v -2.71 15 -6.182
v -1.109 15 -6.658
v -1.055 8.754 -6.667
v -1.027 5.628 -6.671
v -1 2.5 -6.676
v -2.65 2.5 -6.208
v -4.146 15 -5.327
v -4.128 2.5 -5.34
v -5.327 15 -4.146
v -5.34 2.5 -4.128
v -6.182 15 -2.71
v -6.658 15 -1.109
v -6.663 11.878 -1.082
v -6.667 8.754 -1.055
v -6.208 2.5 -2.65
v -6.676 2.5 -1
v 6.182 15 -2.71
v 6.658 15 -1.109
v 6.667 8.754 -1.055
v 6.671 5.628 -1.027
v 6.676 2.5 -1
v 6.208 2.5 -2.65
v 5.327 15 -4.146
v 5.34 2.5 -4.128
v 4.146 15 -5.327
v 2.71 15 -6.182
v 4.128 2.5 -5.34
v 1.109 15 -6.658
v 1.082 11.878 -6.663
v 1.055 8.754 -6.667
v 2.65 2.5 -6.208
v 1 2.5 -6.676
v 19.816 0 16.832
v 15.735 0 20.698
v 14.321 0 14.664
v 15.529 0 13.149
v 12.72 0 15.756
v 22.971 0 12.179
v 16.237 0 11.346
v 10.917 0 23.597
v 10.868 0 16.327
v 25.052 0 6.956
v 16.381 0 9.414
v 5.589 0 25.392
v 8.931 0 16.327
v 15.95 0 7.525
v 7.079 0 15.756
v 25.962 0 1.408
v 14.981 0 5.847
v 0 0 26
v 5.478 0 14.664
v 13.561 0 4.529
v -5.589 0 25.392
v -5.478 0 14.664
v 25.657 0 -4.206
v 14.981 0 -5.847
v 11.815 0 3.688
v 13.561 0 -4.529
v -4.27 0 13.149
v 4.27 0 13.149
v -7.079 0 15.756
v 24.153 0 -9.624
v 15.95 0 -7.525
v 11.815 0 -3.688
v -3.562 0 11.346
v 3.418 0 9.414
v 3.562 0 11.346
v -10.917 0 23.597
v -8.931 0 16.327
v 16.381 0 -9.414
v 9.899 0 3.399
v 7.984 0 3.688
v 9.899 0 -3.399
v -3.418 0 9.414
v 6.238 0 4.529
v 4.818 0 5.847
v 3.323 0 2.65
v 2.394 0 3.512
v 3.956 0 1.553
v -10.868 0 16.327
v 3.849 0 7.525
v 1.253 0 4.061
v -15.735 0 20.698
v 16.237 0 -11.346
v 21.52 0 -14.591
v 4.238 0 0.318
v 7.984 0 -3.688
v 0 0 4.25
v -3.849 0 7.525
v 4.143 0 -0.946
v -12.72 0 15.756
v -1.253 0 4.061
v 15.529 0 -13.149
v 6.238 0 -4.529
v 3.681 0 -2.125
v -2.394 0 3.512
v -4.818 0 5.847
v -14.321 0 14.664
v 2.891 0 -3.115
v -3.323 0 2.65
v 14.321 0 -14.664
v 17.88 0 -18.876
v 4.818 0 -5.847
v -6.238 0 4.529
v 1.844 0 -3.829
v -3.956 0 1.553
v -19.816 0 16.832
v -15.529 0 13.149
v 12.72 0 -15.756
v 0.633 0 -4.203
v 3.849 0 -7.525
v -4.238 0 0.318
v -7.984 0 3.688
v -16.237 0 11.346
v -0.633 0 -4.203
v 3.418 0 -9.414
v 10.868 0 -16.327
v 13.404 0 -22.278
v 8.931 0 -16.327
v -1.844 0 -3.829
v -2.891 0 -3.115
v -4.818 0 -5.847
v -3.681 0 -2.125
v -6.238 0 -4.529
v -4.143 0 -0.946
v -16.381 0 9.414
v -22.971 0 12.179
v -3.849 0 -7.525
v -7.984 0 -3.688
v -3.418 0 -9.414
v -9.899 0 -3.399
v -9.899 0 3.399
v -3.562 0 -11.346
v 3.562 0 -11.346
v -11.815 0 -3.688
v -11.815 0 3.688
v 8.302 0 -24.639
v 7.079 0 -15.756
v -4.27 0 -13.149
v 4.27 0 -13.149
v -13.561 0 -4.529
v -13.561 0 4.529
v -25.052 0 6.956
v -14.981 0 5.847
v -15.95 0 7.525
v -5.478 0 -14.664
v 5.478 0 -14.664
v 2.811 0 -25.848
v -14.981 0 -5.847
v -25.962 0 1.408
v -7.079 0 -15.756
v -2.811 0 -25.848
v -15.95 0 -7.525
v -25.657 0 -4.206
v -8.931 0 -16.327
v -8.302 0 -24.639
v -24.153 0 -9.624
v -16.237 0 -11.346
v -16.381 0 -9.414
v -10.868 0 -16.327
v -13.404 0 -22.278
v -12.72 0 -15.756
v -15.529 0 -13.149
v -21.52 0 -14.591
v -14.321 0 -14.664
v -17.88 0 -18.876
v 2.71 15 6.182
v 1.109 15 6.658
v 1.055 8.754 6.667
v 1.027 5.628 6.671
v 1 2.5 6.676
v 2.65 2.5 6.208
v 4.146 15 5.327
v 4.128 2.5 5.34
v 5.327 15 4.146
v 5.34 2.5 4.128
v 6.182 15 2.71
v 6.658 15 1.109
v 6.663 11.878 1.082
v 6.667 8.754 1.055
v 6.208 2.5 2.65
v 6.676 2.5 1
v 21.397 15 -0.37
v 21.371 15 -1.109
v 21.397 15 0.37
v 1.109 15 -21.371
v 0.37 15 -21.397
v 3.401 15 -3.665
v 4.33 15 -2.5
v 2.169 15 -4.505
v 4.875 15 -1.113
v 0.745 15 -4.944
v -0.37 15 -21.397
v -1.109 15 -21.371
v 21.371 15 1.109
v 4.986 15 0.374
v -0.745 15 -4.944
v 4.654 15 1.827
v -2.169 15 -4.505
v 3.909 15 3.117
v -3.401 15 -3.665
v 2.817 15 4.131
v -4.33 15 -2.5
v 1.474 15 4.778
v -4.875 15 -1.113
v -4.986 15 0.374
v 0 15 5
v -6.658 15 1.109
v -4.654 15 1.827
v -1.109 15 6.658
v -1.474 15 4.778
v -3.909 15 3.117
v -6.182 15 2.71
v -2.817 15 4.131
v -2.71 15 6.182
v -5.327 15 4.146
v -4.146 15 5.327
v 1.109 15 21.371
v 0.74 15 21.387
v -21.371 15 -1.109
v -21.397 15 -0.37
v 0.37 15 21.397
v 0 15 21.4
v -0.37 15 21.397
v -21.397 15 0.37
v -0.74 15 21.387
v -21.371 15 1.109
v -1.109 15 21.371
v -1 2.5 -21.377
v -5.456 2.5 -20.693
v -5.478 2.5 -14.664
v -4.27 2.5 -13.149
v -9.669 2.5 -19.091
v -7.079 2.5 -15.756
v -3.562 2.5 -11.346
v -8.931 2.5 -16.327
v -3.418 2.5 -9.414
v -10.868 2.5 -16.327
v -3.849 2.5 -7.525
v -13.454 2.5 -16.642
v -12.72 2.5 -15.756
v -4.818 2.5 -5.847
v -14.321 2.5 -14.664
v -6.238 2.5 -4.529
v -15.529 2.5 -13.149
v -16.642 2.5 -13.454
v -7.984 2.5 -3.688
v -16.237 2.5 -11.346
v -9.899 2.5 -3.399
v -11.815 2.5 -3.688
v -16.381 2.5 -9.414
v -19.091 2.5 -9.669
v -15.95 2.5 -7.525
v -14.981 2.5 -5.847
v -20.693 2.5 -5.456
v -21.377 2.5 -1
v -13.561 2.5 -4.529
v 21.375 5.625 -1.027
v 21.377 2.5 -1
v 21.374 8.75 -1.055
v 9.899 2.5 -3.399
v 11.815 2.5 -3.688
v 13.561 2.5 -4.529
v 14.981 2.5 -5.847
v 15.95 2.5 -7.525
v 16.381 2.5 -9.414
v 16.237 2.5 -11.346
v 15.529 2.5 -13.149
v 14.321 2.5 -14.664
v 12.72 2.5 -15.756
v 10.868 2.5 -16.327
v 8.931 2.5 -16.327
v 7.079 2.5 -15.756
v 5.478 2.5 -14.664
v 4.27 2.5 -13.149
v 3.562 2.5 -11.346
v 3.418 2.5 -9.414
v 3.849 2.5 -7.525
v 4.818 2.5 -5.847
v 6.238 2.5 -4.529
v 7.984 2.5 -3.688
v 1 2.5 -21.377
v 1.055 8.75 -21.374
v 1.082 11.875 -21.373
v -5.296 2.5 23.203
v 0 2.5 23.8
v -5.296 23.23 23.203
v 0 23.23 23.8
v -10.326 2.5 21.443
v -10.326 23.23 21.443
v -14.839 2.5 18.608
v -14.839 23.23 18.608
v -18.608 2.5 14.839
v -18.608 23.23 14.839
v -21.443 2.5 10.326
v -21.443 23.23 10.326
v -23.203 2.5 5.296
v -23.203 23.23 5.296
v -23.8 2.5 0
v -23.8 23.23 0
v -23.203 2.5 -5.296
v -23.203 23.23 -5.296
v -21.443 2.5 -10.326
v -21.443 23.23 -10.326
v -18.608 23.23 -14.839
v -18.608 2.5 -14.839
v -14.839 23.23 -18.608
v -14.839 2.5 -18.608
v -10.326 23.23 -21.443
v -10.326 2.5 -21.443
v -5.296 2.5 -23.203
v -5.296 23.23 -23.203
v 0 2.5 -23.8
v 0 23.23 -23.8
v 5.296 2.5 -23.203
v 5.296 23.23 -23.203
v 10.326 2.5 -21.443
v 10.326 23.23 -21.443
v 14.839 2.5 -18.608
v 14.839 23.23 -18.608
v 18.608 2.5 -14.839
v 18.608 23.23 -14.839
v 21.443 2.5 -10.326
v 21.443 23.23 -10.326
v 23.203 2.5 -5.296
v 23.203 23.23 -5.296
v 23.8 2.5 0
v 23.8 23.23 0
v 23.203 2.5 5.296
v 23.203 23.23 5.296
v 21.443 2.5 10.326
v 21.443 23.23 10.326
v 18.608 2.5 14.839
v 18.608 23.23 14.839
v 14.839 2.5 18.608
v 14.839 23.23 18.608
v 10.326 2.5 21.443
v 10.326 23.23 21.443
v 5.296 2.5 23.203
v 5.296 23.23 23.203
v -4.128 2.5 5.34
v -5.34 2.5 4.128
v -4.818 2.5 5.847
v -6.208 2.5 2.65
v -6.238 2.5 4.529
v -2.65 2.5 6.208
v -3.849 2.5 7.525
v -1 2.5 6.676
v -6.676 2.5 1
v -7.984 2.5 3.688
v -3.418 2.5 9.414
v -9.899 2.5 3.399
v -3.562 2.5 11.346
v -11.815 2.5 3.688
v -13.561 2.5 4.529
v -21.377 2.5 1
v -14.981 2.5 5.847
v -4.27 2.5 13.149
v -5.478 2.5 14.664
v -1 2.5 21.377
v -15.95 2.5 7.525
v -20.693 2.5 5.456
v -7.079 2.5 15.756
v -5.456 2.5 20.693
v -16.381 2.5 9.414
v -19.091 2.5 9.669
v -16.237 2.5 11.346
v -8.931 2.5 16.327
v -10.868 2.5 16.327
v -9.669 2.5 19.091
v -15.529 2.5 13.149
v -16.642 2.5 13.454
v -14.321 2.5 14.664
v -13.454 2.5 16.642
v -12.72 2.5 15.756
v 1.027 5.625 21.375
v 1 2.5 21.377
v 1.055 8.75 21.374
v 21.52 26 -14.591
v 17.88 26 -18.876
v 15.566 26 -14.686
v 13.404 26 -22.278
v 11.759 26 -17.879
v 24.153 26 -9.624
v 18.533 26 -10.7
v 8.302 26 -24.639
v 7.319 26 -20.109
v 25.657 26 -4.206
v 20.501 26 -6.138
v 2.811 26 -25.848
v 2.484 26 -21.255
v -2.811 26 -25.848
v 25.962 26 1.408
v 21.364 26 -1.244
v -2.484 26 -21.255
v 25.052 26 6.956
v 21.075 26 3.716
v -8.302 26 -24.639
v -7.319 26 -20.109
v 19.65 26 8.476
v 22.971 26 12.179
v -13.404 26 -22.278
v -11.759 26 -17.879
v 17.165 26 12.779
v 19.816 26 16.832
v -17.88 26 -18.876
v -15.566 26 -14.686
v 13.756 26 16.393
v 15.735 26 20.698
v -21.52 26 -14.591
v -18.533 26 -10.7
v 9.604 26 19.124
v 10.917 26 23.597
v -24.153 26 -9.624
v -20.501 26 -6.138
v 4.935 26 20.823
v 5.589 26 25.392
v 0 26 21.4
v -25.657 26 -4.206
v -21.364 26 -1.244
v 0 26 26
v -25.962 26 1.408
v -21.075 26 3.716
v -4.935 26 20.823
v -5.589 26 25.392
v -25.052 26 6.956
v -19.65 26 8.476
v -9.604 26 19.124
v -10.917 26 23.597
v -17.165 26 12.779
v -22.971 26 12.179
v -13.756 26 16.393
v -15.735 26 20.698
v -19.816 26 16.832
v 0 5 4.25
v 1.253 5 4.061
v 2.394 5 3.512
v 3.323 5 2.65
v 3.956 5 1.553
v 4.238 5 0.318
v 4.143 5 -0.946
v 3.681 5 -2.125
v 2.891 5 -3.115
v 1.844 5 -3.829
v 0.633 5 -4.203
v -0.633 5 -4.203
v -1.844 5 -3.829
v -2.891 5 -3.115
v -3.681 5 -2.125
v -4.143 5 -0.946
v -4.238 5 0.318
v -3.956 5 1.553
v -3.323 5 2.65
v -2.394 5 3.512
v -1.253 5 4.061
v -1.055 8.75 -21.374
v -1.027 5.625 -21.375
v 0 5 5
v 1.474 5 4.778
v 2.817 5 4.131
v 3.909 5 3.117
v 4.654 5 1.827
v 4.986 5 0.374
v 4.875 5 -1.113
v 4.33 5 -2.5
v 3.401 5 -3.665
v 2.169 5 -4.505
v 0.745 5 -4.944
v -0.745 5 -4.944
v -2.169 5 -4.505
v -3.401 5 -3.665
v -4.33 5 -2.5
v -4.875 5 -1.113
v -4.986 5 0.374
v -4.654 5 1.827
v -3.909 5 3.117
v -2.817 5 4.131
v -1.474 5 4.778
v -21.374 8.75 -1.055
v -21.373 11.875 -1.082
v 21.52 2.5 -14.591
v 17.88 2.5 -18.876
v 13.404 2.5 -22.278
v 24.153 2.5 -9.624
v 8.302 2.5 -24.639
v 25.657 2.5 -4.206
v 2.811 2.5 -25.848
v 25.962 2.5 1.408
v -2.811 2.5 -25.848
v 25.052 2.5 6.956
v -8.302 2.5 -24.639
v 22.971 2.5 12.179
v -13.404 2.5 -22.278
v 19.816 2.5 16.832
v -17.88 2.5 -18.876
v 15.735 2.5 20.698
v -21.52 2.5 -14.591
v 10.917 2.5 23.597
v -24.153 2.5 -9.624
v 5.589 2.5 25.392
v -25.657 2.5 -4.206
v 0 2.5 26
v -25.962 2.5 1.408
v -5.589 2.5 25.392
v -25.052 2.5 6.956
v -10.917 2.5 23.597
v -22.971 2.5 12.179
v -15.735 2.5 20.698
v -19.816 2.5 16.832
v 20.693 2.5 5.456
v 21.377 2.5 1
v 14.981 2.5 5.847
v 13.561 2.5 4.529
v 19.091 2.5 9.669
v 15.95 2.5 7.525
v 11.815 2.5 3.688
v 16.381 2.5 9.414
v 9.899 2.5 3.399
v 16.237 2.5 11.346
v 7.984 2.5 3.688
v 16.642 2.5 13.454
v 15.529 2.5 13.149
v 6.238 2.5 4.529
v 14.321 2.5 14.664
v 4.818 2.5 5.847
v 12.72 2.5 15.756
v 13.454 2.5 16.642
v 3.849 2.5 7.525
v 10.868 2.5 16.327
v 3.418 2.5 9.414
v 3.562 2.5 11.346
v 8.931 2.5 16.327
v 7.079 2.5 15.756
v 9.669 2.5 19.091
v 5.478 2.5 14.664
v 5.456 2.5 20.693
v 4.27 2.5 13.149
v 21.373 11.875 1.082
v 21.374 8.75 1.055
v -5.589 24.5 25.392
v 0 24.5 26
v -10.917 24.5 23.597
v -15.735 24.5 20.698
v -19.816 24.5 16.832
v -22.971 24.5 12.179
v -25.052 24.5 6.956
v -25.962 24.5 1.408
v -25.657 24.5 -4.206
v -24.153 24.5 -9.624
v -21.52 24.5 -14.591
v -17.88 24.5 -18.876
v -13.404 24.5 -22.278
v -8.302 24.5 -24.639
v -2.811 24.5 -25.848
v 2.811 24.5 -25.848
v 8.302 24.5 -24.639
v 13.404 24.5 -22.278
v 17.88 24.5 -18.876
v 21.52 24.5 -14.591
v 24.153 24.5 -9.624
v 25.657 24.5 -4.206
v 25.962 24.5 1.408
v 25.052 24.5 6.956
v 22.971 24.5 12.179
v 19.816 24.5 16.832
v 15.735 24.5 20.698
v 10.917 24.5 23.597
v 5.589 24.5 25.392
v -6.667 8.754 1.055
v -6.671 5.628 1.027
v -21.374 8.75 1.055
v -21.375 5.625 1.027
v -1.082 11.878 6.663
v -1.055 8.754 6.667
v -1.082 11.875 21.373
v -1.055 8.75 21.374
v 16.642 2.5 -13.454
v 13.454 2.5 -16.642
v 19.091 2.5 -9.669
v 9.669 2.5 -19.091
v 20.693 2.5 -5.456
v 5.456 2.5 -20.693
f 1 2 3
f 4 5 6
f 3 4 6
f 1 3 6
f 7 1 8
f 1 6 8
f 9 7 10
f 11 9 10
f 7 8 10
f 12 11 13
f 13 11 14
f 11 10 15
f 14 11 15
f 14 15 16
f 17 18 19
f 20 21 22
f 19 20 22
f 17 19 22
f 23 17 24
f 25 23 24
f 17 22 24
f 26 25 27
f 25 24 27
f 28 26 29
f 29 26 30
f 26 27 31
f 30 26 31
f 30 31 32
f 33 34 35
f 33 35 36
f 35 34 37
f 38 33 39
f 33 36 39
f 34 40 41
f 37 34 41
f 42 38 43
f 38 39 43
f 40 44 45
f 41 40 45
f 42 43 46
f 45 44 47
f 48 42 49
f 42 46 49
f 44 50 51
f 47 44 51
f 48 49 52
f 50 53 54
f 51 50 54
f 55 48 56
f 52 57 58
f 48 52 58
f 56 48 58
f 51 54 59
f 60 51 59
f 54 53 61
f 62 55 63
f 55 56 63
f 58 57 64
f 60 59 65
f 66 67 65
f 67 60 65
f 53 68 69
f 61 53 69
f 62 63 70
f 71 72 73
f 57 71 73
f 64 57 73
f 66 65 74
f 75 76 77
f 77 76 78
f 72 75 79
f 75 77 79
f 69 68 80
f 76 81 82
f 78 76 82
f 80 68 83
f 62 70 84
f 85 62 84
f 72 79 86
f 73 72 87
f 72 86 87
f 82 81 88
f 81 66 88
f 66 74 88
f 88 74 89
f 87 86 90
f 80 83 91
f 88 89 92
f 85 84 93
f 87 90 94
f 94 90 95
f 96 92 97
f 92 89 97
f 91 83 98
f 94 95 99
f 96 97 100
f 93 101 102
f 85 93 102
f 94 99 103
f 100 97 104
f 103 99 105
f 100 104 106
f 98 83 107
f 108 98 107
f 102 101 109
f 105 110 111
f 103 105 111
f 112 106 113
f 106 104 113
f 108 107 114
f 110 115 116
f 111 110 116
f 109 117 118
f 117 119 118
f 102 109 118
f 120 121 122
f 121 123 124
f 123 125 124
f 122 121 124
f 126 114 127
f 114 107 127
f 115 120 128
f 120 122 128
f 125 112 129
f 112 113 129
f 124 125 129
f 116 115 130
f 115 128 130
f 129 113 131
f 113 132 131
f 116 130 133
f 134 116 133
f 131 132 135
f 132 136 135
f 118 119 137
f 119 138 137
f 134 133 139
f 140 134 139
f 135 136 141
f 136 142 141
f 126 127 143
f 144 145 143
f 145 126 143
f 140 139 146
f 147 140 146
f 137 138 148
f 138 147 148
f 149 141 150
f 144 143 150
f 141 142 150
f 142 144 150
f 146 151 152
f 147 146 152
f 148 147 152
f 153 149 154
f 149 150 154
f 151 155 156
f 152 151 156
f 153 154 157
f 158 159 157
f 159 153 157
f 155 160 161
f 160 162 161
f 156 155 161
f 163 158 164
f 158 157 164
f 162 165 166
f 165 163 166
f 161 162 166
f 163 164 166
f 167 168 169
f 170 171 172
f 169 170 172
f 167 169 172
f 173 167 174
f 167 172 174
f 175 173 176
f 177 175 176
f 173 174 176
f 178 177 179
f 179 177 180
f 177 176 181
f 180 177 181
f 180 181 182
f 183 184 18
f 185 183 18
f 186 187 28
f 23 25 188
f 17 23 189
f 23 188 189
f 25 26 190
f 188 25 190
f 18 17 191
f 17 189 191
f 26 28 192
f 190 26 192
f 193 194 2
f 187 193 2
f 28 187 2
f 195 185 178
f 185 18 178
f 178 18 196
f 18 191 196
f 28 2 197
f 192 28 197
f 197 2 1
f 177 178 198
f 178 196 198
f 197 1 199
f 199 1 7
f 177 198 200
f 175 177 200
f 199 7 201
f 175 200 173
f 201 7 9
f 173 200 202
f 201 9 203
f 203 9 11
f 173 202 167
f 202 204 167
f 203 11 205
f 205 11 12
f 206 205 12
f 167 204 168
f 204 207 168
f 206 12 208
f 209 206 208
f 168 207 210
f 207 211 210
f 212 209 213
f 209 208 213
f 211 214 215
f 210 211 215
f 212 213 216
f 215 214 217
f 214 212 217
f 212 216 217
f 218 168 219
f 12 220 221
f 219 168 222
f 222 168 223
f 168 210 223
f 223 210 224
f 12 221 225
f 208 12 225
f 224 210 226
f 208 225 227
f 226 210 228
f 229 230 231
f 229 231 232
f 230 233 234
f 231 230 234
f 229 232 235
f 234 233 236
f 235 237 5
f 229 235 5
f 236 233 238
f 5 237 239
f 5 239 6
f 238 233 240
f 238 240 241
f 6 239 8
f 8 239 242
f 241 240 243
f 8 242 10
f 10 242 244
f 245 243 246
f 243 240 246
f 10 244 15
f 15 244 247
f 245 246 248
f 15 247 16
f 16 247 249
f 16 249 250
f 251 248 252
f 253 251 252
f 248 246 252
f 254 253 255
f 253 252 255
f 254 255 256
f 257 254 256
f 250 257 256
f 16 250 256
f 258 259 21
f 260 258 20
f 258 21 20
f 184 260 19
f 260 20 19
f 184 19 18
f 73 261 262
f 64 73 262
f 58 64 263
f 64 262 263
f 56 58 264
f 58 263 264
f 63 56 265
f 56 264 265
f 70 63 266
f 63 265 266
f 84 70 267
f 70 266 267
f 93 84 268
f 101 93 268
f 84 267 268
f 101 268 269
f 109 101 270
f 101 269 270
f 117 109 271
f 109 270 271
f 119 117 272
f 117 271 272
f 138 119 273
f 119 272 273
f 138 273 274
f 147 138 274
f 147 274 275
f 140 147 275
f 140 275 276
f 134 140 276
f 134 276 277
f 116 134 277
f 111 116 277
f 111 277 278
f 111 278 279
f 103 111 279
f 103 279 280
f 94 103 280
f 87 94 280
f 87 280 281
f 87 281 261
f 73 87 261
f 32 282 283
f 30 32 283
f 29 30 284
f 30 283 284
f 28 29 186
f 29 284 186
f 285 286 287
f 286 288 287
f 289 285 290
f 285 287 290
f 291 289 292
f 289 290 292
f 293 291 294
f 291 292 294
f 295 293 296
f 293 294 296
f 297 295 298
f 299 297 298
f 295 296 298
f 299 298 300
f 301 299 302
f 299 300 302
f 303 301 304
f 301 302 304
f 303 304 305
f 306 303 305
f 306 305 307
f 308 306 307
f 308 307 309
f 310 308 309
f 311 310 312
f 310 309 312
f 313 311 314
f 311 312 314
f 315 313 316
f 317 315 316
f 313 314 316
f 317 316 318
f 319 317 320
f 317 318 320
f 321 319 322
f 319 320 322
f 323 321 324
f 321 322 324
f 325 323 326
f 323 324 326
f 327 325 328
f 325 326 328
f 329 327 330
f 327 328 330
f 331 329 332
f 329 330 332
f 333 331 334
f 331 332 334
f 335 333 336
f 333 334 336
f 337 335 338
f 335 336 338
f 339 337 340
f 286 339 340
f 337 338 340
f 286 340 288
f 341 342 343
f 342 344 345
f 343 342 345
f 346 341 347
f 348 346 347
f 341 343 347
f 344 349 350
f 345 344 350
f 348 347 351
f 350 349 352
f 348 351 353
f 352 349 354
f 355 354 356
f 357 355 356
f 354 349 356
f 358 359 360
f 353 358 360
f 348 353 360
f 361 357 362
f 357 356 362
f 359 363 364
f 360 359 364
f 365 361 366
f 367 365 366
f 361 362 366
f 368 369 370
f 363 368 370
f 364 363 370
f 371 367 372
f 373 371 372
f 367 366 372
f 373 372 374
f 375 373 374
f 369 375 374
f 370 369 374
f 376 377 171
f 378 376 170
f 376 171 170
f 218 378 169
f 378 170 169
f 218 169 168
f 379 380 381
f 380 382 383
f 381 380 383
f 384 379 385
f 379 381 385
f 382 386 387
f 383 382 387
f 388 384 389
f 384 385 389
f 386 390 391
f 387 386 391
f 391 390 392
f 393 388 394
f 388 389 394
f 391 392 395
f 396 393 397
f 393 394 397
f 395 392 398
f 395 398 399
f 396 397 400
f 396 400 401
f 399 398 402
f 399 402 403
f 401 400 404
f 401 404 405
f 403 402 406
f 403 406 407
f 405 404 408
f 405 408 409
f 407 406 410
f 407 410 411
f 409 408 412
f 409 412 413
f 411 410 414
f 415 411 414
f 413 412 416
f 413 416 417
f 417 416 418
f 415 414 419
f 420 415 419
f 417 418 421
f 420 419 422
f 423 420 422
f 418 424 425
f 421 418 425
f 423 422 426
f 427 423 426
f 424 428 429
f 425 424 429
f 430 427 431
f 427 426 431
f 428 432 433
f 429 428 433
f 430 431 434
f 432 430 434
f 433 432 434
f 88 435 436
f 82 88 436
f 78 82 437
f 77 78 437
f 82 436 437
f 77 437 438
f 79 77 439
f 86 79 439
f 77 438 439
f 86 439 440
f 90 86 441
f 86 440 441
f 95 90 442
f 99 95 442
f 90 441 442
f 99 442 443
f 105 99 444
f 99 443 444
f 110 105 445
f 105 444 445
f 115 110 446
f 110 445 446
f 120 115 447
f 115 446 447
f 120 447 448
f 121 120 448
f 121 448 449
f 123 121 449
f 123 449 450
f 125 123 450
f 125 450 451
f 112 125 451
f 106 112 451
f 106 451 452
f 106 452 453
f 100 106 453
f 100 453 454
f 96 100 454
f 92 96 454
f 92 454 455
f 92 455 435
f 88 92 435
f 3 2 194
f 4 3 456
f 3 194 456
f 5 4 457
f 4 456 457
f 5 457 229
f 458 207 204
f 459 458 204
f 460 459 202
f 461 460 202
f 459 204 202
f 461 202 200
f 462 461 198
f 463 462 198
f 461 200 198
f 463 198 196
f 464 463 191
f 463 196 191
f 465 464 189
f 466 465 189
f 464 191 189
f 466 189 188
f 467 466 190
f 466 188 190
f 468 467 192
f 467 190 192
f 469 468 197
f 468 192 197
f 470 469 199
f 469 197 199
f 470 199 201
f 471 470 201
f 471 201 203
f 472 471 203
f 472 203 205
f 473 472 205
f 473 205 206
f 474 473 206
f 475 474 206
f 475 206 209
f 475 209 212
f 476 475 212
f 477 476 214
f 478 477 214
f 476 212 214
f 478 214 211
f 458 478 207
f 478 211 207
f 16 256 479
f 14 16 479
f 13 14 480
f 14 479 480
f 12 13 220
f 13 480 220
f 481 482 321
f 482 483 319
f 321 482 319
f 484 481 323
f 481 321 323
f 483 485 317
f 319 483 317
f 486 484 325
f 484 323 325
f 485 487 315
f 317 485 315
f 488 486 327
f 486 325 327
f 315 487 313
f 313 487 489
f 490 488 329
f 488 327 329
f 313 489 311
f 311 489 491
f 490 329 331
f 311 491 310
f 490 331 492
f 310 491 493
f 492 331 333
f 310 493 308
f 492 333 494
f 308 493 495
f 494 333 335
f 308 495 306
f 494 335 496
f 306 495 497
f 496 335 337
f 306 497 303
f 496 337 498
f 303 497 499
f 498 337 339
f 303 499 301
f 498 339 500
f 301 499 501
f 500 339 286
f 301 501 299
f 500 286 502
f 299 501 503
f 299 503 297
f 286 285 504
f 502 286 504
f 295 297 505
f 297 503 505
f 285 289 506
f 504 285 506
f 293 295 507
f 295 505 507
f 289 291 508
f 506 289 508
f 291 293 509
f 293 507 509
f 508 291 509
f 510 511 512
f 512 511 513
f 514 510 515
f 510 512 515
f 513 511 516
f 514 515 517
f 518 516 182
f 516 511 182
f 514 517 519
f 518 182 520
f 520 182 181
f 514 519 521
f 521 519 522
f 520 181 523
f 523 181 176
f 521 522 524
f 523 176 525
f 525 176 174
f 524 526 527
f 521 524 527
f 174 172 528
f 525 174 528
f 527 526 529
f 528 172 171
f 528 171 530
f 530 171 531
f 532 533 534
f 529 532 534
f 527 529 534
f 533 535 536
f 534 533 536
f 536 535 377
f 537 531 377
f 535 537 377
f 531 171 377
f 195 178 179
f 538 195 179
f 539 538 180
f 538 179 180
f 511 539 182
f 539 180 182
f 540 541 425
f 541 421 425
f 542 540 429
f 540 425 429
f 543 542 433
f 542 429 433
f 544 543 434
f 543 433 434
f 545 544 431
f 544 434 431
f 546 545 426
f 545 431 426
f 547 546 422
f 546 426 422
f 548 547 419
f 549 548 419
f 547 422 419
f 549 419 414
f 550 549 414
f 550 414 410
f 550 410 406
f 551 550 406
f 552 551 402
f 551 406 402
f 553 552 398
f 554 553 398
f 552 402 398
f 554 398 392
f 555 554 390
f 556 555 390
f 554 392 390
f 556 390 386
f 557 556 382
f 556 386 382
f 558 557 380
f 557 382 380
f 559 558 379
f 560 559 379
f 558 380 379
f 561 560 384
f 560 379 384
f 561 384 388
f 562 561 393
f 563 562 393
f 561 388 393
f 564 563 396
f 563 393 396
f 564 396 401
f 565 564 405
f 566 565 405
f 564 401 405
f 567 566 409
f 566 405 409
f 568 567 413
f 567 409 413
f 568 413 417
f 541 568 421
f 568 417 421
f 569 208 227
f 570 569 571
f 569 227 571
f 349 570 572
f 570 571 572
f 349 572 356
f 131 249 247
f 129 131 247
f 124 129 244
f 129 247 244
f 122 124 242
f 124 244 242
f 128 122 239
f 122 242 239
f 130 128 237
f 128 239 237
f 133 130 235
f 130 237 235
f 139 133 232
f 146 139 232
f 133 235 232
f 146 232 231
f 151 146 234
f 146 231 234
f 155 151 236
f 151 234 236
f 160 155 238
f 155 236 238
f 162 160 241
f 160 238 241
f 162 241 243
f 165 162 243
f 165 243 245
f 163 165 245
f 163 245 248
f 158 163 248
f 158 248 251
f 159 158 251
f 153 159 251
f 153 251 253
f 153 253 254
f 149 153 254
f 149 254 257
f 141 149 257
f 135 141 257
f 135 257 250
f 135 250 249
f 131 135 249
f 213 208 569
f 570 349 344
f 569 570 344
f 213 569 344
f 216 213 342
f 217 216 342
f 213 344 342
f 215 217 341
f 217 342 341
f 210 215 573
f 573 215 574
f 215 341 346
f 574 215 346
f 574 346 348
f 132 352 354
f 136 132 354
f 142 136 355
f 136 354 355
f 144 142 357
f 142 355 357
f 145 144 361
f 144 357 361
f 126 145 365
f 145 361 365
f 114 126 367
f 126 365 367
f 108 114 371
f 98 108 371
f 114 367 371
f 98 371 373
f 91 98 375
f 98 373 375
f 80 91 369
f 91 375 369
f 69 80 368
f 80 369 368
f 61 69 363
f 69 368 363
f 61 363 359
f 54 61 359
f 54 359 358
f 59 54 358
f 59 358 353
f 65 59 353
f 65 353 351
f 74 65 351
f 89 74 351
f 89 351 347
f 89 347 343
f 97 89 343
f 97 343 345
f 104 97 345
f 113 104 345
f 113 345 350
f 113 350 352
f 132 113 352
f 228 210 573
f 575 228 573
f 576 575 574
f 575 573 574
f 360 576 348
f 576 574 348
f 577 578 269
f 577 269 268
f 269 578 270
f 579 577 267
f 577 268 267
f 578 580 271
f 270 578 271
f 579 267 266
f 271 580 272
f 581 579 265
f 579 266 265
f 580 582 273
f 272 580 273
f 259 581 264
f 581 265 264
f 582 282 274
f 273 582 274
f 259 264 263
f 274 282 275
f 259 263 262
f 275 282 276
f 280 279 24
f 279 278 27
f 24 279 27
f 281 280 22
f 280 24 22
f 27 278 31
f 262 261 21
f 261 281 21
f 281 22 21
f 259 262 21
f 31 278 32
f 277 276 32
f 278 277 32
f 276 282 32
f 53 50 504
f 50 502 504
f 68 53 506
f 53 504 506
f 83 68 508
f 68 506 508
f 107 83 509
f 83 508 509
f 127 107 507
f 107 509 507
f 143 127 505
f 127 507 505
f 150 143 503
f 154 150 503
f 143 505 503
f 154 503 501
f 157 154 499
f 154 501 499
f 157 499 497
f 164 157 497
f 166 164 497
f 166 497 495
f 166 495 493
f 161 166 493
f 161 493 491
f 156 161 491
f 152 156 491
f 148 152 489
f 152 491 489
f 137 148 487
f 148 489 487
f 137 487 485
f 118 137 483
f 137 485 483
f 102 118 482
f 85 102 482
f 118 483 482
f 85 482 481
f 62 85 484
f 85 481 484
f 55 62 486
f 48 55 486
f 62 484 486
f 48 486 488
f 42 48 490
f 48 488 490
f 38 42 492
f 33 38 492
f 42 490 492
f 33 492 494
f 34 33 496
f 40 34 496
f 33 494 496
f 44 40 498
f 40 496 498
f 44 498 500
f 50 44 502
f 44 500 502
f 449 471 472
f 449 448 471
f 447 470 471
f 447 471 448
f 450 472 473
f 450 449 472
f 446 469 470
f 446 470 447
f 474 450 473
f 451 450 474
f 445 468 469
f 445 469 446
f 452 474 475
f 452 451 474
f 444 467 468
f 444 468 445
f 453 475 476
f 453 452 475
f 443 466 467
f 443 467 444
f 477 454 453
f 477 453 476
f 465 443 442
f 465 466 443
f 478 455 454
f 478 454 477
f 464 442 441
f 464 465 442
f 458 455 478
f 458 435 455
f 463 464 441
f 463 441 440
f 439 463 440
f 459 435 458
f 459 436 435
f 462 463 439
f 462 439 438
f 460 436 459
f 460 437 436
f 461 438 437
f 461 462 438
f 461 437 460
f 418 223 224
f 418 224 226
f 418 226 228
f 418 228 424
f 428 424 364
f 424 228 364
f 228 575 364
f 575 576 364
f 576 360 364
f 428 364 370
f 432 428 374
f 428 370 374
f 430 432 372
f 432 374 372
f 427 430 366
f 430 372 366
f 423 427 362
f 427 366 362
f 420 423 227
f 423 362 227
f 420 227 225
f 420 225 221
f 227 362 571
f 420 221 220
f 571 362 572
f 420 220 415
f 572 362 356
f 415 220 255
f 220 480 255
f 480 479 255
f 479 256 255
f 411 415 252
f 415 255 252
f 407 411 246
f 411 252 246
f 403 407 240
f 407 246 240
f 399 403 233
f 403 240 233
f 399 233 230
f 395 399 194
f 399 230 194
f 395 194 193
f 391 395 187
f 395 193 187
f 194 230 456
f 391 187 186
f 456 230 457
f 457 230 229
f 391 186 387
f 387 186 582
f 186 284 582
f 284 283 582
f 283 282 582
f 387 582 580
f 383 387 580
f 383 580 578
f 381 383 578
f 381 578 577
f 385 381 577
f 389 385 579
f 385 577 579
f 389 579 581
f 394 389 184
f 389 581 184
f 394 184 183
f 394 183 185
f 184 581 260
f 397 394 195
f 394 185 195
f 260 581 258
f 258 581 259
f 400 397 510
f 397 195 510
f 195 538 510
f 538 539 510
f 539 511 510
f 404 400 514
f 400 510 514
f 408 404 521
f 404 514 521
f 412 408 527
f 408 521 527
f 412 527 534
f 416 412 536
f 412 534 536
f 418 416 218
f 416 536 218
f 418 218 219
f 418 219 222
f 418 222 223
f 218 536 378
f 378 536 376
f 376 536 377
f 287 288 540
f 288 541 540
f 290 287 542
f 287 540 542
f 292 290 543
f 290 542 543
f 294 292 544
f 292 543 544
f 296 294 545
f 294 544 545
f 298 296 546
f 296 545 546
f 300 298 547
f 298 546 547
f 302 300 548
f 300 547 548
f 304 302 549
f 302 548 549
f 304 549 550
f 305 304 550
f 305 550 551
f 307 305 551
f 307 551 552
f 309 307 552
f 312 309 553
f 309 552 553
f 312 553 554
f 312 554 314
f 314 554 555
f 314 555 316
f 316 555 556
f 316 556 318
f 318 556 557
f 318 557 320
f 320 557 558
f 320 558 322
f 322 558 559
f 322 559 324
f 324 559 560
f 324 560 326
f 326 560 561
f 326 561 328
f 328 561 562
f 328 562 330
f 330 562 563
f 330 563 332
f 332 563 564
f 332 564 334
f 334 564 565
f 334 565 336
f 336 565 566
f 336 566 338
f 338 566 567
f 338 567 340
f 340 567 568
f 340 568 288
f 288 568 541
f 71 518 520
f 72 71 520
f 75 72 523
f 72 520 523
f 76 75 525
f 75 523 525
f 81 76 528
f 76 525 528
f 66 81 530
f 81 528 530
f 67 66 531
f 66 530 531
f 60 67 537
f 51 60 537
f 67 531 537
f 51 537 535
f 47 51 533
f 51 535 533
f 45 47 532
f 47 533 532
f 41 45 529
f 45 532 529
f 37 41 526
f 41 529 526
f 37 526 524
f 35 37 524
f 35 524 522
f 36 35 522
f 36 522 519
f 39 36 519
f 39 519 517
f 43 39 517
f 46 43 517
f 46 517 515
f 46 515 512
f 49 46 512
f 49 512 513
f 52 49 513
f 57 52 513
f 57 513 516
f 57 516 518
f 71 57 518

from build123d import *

# Parameters (mm, degrees)
SKETCH3_R           = 6.75
BOSS_EXTRUDE1_DEPTH = 12.5
SKETCH4_R           = 5
CUT_EXTRUDE1_DEPTH  = 10
SKETCH5_R           = 4.25
CUT_EXTRUDE2_DEPTH  = 43.343830719
RIB1_START          = -22
RIB1_DEPTH          = 15.341739823
RIB1_START_2        = 6.658260177
RIB1_2_DEPTH        = 15.341739823
RIB1_3_DEPTH        = 15.341739823
RIB1_4_DEPTH        = 15.341739823
SKETCH9_R           = 6.5
CUT_EXTRUDE3_DEPTH  = 44.637713047


with BuildPart() as part:
    # Sketch2 → Revolve1 (revolve)
    with BuildSketch(Plane(origin=(0, 0, 0), x_dir=(0, 0, -1), z_dir=(1, 0, 0)), mode=Mode.PRIVATE) as revolve1_sk:
        Polygon((0, 0), (26, 0), (26, 2.5), (23.8, 2.5), (23.8, 23.229829408), (26, 24.5), (26, 26), (21.4, 26), (21.4, 2.5), (0, 2.5), align=None)
    revolve(revolve1_sk.sketch.rotate(Axis((0, 2.5, 0), (0, -1, 0)), 180), axis=Axis((0, 2.5, 0), (0, -1, 0)))

    # Sketch3 → Boss-Extrude1 (add)
    with BuildSketch(Plane(origin=(0, 2.5, 0), x_dir=(1, 0, 0), z_dir=(0, 1, 0))):
        with Locations(Location((0, 0, 0), (0, 0, 90))):
            Circle(SKETCH3_R)
    extrude(amount=BOSS_EXTRUDE1_DEPTH)

    # Sketch4 → Cut-Extrude1 (cut)
    with BuildSketch(Plane(origin=(0, 15, 0), x_dir=(1, 0, 0), z_dir=(0, 1, 0))):
        with Locations(Location((0, 0, 0), (0, 0, 270))):
            Circle(SKETCH4_R)
    extrude(amount=-CUT_EXTRUDE1_DEPTH, mode=Mode.SUBTRACT)

    # Sketch5 → Cut-Extrude2 (cut, through all)
    with BuildSketch(Plane(origin=(0, 5, 0), x_dir=(1, 0, 0), z_dir=(0, 1, 0))):
        with Locations(Location((0, 0, 0), (0, 0, 270))):
            Circle(SKETCH5_R)
    extrude(amount=-CUT_EXTRUDE2_DEPTH, mode=Mode.SUBTRACT)

    # Rib1: read off the stored shape, not the designer's step
    # Rib1 outline → Rib1 (add)
    with BuildSketch(Plane.XY.offset(RIB1_START)):
        Polygon((1, 2.5), (1.109085847, 15), (-1.109085847, 15), (-1, 2.5), align=None)
    extrude(amount=RIB1_DEPTH)

    # Rib1 2 outline → Rib1 2 (add)
    with BuildSketch(Plane.XY.offset(RIB1_START_2)):
        Polygon((1, 2.5), (1.109085847, 15), (-1.109085847, 15), (-1, 2.5), align=None)
    extrude(amount=RIB1_2_DEPTH)

    # Rib1 3 outline → Rib1 3 (add)
    with BuildSketch(Plane.YZ.offset(RIB1_START)):
        Polygon((2.5, -1), (15, -1.109085847), (15, 1.109085847), (2.5, 1), align=None)
    extrude(amount=RIB1_3_DEPTH)

    # Rib1 4 outline → Rib1 4 (add)
    with BuildSketch(Plane.YZ.offset(RIB1_START_2)):
        Polygon((2.5, -1), (15, -1.109085847), (15, 1.109085847), (2.5, 1), align=None)
    extrude(amount=RIB1_4_DEPTH)

    # Sketch9 → Cut-Extrude3 (cut, through all)
    with BuildSketch(Plane(origin=(0, 2.5, 0), x_dir=(1, 0, 0), z_dir=(0, 1, 0))):
        with Locations(Location((-9.899494937, 9.899494937, 0), (0, 0, 270))):
            Circle(SKETCH9_R)
        with Locations(Location((9.899494937, -9.899494937, 0), (0, 0, 90))):
            Circle(SKETCH9_R)
        with Locations(Location((9.899494937, 9.899494937, 0), (0, 0, 270))):
            Circle(SKETCH9_R)
        with Locations(Location((-9.899494937, -9.899494937, 0), (0, 0, 90))):
            Circle(SKETCH9_R)
    extrude(amount=-CUT_EXTRUDE3_DEPTH, mode=Mode.SUBTRACT)


solid = part.part
